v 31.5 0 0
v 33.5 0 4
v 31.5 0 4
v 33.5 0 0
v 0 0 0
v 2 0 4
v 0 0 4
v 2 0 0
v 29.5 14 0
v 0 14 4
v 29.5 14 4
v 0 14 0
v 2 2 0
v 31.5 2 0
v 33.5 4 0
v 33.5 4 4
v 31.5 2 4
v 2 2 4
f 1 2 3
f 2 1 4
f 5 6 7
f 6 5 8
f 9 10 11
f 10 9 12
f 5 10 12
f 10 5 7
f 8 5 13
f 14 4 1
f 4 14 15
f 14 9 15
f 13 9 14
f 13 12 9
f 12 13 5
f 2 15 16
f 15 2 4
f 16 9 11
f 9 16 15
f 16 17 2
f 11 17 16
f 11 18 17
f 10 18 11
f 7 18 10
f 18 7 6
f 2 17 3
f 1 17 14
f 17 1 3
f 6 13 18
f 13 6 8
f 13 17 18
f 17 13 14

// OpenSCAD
ep=4;

jauge=29.5;

difference()
{
hull()
{
    cube([jauge+4,ep,ep]);
   translate([0,10,0]) cube([jauge,ep,ep]);
   }
   translate([2,0,0]) cube([jauge,2,ep]);
   }
